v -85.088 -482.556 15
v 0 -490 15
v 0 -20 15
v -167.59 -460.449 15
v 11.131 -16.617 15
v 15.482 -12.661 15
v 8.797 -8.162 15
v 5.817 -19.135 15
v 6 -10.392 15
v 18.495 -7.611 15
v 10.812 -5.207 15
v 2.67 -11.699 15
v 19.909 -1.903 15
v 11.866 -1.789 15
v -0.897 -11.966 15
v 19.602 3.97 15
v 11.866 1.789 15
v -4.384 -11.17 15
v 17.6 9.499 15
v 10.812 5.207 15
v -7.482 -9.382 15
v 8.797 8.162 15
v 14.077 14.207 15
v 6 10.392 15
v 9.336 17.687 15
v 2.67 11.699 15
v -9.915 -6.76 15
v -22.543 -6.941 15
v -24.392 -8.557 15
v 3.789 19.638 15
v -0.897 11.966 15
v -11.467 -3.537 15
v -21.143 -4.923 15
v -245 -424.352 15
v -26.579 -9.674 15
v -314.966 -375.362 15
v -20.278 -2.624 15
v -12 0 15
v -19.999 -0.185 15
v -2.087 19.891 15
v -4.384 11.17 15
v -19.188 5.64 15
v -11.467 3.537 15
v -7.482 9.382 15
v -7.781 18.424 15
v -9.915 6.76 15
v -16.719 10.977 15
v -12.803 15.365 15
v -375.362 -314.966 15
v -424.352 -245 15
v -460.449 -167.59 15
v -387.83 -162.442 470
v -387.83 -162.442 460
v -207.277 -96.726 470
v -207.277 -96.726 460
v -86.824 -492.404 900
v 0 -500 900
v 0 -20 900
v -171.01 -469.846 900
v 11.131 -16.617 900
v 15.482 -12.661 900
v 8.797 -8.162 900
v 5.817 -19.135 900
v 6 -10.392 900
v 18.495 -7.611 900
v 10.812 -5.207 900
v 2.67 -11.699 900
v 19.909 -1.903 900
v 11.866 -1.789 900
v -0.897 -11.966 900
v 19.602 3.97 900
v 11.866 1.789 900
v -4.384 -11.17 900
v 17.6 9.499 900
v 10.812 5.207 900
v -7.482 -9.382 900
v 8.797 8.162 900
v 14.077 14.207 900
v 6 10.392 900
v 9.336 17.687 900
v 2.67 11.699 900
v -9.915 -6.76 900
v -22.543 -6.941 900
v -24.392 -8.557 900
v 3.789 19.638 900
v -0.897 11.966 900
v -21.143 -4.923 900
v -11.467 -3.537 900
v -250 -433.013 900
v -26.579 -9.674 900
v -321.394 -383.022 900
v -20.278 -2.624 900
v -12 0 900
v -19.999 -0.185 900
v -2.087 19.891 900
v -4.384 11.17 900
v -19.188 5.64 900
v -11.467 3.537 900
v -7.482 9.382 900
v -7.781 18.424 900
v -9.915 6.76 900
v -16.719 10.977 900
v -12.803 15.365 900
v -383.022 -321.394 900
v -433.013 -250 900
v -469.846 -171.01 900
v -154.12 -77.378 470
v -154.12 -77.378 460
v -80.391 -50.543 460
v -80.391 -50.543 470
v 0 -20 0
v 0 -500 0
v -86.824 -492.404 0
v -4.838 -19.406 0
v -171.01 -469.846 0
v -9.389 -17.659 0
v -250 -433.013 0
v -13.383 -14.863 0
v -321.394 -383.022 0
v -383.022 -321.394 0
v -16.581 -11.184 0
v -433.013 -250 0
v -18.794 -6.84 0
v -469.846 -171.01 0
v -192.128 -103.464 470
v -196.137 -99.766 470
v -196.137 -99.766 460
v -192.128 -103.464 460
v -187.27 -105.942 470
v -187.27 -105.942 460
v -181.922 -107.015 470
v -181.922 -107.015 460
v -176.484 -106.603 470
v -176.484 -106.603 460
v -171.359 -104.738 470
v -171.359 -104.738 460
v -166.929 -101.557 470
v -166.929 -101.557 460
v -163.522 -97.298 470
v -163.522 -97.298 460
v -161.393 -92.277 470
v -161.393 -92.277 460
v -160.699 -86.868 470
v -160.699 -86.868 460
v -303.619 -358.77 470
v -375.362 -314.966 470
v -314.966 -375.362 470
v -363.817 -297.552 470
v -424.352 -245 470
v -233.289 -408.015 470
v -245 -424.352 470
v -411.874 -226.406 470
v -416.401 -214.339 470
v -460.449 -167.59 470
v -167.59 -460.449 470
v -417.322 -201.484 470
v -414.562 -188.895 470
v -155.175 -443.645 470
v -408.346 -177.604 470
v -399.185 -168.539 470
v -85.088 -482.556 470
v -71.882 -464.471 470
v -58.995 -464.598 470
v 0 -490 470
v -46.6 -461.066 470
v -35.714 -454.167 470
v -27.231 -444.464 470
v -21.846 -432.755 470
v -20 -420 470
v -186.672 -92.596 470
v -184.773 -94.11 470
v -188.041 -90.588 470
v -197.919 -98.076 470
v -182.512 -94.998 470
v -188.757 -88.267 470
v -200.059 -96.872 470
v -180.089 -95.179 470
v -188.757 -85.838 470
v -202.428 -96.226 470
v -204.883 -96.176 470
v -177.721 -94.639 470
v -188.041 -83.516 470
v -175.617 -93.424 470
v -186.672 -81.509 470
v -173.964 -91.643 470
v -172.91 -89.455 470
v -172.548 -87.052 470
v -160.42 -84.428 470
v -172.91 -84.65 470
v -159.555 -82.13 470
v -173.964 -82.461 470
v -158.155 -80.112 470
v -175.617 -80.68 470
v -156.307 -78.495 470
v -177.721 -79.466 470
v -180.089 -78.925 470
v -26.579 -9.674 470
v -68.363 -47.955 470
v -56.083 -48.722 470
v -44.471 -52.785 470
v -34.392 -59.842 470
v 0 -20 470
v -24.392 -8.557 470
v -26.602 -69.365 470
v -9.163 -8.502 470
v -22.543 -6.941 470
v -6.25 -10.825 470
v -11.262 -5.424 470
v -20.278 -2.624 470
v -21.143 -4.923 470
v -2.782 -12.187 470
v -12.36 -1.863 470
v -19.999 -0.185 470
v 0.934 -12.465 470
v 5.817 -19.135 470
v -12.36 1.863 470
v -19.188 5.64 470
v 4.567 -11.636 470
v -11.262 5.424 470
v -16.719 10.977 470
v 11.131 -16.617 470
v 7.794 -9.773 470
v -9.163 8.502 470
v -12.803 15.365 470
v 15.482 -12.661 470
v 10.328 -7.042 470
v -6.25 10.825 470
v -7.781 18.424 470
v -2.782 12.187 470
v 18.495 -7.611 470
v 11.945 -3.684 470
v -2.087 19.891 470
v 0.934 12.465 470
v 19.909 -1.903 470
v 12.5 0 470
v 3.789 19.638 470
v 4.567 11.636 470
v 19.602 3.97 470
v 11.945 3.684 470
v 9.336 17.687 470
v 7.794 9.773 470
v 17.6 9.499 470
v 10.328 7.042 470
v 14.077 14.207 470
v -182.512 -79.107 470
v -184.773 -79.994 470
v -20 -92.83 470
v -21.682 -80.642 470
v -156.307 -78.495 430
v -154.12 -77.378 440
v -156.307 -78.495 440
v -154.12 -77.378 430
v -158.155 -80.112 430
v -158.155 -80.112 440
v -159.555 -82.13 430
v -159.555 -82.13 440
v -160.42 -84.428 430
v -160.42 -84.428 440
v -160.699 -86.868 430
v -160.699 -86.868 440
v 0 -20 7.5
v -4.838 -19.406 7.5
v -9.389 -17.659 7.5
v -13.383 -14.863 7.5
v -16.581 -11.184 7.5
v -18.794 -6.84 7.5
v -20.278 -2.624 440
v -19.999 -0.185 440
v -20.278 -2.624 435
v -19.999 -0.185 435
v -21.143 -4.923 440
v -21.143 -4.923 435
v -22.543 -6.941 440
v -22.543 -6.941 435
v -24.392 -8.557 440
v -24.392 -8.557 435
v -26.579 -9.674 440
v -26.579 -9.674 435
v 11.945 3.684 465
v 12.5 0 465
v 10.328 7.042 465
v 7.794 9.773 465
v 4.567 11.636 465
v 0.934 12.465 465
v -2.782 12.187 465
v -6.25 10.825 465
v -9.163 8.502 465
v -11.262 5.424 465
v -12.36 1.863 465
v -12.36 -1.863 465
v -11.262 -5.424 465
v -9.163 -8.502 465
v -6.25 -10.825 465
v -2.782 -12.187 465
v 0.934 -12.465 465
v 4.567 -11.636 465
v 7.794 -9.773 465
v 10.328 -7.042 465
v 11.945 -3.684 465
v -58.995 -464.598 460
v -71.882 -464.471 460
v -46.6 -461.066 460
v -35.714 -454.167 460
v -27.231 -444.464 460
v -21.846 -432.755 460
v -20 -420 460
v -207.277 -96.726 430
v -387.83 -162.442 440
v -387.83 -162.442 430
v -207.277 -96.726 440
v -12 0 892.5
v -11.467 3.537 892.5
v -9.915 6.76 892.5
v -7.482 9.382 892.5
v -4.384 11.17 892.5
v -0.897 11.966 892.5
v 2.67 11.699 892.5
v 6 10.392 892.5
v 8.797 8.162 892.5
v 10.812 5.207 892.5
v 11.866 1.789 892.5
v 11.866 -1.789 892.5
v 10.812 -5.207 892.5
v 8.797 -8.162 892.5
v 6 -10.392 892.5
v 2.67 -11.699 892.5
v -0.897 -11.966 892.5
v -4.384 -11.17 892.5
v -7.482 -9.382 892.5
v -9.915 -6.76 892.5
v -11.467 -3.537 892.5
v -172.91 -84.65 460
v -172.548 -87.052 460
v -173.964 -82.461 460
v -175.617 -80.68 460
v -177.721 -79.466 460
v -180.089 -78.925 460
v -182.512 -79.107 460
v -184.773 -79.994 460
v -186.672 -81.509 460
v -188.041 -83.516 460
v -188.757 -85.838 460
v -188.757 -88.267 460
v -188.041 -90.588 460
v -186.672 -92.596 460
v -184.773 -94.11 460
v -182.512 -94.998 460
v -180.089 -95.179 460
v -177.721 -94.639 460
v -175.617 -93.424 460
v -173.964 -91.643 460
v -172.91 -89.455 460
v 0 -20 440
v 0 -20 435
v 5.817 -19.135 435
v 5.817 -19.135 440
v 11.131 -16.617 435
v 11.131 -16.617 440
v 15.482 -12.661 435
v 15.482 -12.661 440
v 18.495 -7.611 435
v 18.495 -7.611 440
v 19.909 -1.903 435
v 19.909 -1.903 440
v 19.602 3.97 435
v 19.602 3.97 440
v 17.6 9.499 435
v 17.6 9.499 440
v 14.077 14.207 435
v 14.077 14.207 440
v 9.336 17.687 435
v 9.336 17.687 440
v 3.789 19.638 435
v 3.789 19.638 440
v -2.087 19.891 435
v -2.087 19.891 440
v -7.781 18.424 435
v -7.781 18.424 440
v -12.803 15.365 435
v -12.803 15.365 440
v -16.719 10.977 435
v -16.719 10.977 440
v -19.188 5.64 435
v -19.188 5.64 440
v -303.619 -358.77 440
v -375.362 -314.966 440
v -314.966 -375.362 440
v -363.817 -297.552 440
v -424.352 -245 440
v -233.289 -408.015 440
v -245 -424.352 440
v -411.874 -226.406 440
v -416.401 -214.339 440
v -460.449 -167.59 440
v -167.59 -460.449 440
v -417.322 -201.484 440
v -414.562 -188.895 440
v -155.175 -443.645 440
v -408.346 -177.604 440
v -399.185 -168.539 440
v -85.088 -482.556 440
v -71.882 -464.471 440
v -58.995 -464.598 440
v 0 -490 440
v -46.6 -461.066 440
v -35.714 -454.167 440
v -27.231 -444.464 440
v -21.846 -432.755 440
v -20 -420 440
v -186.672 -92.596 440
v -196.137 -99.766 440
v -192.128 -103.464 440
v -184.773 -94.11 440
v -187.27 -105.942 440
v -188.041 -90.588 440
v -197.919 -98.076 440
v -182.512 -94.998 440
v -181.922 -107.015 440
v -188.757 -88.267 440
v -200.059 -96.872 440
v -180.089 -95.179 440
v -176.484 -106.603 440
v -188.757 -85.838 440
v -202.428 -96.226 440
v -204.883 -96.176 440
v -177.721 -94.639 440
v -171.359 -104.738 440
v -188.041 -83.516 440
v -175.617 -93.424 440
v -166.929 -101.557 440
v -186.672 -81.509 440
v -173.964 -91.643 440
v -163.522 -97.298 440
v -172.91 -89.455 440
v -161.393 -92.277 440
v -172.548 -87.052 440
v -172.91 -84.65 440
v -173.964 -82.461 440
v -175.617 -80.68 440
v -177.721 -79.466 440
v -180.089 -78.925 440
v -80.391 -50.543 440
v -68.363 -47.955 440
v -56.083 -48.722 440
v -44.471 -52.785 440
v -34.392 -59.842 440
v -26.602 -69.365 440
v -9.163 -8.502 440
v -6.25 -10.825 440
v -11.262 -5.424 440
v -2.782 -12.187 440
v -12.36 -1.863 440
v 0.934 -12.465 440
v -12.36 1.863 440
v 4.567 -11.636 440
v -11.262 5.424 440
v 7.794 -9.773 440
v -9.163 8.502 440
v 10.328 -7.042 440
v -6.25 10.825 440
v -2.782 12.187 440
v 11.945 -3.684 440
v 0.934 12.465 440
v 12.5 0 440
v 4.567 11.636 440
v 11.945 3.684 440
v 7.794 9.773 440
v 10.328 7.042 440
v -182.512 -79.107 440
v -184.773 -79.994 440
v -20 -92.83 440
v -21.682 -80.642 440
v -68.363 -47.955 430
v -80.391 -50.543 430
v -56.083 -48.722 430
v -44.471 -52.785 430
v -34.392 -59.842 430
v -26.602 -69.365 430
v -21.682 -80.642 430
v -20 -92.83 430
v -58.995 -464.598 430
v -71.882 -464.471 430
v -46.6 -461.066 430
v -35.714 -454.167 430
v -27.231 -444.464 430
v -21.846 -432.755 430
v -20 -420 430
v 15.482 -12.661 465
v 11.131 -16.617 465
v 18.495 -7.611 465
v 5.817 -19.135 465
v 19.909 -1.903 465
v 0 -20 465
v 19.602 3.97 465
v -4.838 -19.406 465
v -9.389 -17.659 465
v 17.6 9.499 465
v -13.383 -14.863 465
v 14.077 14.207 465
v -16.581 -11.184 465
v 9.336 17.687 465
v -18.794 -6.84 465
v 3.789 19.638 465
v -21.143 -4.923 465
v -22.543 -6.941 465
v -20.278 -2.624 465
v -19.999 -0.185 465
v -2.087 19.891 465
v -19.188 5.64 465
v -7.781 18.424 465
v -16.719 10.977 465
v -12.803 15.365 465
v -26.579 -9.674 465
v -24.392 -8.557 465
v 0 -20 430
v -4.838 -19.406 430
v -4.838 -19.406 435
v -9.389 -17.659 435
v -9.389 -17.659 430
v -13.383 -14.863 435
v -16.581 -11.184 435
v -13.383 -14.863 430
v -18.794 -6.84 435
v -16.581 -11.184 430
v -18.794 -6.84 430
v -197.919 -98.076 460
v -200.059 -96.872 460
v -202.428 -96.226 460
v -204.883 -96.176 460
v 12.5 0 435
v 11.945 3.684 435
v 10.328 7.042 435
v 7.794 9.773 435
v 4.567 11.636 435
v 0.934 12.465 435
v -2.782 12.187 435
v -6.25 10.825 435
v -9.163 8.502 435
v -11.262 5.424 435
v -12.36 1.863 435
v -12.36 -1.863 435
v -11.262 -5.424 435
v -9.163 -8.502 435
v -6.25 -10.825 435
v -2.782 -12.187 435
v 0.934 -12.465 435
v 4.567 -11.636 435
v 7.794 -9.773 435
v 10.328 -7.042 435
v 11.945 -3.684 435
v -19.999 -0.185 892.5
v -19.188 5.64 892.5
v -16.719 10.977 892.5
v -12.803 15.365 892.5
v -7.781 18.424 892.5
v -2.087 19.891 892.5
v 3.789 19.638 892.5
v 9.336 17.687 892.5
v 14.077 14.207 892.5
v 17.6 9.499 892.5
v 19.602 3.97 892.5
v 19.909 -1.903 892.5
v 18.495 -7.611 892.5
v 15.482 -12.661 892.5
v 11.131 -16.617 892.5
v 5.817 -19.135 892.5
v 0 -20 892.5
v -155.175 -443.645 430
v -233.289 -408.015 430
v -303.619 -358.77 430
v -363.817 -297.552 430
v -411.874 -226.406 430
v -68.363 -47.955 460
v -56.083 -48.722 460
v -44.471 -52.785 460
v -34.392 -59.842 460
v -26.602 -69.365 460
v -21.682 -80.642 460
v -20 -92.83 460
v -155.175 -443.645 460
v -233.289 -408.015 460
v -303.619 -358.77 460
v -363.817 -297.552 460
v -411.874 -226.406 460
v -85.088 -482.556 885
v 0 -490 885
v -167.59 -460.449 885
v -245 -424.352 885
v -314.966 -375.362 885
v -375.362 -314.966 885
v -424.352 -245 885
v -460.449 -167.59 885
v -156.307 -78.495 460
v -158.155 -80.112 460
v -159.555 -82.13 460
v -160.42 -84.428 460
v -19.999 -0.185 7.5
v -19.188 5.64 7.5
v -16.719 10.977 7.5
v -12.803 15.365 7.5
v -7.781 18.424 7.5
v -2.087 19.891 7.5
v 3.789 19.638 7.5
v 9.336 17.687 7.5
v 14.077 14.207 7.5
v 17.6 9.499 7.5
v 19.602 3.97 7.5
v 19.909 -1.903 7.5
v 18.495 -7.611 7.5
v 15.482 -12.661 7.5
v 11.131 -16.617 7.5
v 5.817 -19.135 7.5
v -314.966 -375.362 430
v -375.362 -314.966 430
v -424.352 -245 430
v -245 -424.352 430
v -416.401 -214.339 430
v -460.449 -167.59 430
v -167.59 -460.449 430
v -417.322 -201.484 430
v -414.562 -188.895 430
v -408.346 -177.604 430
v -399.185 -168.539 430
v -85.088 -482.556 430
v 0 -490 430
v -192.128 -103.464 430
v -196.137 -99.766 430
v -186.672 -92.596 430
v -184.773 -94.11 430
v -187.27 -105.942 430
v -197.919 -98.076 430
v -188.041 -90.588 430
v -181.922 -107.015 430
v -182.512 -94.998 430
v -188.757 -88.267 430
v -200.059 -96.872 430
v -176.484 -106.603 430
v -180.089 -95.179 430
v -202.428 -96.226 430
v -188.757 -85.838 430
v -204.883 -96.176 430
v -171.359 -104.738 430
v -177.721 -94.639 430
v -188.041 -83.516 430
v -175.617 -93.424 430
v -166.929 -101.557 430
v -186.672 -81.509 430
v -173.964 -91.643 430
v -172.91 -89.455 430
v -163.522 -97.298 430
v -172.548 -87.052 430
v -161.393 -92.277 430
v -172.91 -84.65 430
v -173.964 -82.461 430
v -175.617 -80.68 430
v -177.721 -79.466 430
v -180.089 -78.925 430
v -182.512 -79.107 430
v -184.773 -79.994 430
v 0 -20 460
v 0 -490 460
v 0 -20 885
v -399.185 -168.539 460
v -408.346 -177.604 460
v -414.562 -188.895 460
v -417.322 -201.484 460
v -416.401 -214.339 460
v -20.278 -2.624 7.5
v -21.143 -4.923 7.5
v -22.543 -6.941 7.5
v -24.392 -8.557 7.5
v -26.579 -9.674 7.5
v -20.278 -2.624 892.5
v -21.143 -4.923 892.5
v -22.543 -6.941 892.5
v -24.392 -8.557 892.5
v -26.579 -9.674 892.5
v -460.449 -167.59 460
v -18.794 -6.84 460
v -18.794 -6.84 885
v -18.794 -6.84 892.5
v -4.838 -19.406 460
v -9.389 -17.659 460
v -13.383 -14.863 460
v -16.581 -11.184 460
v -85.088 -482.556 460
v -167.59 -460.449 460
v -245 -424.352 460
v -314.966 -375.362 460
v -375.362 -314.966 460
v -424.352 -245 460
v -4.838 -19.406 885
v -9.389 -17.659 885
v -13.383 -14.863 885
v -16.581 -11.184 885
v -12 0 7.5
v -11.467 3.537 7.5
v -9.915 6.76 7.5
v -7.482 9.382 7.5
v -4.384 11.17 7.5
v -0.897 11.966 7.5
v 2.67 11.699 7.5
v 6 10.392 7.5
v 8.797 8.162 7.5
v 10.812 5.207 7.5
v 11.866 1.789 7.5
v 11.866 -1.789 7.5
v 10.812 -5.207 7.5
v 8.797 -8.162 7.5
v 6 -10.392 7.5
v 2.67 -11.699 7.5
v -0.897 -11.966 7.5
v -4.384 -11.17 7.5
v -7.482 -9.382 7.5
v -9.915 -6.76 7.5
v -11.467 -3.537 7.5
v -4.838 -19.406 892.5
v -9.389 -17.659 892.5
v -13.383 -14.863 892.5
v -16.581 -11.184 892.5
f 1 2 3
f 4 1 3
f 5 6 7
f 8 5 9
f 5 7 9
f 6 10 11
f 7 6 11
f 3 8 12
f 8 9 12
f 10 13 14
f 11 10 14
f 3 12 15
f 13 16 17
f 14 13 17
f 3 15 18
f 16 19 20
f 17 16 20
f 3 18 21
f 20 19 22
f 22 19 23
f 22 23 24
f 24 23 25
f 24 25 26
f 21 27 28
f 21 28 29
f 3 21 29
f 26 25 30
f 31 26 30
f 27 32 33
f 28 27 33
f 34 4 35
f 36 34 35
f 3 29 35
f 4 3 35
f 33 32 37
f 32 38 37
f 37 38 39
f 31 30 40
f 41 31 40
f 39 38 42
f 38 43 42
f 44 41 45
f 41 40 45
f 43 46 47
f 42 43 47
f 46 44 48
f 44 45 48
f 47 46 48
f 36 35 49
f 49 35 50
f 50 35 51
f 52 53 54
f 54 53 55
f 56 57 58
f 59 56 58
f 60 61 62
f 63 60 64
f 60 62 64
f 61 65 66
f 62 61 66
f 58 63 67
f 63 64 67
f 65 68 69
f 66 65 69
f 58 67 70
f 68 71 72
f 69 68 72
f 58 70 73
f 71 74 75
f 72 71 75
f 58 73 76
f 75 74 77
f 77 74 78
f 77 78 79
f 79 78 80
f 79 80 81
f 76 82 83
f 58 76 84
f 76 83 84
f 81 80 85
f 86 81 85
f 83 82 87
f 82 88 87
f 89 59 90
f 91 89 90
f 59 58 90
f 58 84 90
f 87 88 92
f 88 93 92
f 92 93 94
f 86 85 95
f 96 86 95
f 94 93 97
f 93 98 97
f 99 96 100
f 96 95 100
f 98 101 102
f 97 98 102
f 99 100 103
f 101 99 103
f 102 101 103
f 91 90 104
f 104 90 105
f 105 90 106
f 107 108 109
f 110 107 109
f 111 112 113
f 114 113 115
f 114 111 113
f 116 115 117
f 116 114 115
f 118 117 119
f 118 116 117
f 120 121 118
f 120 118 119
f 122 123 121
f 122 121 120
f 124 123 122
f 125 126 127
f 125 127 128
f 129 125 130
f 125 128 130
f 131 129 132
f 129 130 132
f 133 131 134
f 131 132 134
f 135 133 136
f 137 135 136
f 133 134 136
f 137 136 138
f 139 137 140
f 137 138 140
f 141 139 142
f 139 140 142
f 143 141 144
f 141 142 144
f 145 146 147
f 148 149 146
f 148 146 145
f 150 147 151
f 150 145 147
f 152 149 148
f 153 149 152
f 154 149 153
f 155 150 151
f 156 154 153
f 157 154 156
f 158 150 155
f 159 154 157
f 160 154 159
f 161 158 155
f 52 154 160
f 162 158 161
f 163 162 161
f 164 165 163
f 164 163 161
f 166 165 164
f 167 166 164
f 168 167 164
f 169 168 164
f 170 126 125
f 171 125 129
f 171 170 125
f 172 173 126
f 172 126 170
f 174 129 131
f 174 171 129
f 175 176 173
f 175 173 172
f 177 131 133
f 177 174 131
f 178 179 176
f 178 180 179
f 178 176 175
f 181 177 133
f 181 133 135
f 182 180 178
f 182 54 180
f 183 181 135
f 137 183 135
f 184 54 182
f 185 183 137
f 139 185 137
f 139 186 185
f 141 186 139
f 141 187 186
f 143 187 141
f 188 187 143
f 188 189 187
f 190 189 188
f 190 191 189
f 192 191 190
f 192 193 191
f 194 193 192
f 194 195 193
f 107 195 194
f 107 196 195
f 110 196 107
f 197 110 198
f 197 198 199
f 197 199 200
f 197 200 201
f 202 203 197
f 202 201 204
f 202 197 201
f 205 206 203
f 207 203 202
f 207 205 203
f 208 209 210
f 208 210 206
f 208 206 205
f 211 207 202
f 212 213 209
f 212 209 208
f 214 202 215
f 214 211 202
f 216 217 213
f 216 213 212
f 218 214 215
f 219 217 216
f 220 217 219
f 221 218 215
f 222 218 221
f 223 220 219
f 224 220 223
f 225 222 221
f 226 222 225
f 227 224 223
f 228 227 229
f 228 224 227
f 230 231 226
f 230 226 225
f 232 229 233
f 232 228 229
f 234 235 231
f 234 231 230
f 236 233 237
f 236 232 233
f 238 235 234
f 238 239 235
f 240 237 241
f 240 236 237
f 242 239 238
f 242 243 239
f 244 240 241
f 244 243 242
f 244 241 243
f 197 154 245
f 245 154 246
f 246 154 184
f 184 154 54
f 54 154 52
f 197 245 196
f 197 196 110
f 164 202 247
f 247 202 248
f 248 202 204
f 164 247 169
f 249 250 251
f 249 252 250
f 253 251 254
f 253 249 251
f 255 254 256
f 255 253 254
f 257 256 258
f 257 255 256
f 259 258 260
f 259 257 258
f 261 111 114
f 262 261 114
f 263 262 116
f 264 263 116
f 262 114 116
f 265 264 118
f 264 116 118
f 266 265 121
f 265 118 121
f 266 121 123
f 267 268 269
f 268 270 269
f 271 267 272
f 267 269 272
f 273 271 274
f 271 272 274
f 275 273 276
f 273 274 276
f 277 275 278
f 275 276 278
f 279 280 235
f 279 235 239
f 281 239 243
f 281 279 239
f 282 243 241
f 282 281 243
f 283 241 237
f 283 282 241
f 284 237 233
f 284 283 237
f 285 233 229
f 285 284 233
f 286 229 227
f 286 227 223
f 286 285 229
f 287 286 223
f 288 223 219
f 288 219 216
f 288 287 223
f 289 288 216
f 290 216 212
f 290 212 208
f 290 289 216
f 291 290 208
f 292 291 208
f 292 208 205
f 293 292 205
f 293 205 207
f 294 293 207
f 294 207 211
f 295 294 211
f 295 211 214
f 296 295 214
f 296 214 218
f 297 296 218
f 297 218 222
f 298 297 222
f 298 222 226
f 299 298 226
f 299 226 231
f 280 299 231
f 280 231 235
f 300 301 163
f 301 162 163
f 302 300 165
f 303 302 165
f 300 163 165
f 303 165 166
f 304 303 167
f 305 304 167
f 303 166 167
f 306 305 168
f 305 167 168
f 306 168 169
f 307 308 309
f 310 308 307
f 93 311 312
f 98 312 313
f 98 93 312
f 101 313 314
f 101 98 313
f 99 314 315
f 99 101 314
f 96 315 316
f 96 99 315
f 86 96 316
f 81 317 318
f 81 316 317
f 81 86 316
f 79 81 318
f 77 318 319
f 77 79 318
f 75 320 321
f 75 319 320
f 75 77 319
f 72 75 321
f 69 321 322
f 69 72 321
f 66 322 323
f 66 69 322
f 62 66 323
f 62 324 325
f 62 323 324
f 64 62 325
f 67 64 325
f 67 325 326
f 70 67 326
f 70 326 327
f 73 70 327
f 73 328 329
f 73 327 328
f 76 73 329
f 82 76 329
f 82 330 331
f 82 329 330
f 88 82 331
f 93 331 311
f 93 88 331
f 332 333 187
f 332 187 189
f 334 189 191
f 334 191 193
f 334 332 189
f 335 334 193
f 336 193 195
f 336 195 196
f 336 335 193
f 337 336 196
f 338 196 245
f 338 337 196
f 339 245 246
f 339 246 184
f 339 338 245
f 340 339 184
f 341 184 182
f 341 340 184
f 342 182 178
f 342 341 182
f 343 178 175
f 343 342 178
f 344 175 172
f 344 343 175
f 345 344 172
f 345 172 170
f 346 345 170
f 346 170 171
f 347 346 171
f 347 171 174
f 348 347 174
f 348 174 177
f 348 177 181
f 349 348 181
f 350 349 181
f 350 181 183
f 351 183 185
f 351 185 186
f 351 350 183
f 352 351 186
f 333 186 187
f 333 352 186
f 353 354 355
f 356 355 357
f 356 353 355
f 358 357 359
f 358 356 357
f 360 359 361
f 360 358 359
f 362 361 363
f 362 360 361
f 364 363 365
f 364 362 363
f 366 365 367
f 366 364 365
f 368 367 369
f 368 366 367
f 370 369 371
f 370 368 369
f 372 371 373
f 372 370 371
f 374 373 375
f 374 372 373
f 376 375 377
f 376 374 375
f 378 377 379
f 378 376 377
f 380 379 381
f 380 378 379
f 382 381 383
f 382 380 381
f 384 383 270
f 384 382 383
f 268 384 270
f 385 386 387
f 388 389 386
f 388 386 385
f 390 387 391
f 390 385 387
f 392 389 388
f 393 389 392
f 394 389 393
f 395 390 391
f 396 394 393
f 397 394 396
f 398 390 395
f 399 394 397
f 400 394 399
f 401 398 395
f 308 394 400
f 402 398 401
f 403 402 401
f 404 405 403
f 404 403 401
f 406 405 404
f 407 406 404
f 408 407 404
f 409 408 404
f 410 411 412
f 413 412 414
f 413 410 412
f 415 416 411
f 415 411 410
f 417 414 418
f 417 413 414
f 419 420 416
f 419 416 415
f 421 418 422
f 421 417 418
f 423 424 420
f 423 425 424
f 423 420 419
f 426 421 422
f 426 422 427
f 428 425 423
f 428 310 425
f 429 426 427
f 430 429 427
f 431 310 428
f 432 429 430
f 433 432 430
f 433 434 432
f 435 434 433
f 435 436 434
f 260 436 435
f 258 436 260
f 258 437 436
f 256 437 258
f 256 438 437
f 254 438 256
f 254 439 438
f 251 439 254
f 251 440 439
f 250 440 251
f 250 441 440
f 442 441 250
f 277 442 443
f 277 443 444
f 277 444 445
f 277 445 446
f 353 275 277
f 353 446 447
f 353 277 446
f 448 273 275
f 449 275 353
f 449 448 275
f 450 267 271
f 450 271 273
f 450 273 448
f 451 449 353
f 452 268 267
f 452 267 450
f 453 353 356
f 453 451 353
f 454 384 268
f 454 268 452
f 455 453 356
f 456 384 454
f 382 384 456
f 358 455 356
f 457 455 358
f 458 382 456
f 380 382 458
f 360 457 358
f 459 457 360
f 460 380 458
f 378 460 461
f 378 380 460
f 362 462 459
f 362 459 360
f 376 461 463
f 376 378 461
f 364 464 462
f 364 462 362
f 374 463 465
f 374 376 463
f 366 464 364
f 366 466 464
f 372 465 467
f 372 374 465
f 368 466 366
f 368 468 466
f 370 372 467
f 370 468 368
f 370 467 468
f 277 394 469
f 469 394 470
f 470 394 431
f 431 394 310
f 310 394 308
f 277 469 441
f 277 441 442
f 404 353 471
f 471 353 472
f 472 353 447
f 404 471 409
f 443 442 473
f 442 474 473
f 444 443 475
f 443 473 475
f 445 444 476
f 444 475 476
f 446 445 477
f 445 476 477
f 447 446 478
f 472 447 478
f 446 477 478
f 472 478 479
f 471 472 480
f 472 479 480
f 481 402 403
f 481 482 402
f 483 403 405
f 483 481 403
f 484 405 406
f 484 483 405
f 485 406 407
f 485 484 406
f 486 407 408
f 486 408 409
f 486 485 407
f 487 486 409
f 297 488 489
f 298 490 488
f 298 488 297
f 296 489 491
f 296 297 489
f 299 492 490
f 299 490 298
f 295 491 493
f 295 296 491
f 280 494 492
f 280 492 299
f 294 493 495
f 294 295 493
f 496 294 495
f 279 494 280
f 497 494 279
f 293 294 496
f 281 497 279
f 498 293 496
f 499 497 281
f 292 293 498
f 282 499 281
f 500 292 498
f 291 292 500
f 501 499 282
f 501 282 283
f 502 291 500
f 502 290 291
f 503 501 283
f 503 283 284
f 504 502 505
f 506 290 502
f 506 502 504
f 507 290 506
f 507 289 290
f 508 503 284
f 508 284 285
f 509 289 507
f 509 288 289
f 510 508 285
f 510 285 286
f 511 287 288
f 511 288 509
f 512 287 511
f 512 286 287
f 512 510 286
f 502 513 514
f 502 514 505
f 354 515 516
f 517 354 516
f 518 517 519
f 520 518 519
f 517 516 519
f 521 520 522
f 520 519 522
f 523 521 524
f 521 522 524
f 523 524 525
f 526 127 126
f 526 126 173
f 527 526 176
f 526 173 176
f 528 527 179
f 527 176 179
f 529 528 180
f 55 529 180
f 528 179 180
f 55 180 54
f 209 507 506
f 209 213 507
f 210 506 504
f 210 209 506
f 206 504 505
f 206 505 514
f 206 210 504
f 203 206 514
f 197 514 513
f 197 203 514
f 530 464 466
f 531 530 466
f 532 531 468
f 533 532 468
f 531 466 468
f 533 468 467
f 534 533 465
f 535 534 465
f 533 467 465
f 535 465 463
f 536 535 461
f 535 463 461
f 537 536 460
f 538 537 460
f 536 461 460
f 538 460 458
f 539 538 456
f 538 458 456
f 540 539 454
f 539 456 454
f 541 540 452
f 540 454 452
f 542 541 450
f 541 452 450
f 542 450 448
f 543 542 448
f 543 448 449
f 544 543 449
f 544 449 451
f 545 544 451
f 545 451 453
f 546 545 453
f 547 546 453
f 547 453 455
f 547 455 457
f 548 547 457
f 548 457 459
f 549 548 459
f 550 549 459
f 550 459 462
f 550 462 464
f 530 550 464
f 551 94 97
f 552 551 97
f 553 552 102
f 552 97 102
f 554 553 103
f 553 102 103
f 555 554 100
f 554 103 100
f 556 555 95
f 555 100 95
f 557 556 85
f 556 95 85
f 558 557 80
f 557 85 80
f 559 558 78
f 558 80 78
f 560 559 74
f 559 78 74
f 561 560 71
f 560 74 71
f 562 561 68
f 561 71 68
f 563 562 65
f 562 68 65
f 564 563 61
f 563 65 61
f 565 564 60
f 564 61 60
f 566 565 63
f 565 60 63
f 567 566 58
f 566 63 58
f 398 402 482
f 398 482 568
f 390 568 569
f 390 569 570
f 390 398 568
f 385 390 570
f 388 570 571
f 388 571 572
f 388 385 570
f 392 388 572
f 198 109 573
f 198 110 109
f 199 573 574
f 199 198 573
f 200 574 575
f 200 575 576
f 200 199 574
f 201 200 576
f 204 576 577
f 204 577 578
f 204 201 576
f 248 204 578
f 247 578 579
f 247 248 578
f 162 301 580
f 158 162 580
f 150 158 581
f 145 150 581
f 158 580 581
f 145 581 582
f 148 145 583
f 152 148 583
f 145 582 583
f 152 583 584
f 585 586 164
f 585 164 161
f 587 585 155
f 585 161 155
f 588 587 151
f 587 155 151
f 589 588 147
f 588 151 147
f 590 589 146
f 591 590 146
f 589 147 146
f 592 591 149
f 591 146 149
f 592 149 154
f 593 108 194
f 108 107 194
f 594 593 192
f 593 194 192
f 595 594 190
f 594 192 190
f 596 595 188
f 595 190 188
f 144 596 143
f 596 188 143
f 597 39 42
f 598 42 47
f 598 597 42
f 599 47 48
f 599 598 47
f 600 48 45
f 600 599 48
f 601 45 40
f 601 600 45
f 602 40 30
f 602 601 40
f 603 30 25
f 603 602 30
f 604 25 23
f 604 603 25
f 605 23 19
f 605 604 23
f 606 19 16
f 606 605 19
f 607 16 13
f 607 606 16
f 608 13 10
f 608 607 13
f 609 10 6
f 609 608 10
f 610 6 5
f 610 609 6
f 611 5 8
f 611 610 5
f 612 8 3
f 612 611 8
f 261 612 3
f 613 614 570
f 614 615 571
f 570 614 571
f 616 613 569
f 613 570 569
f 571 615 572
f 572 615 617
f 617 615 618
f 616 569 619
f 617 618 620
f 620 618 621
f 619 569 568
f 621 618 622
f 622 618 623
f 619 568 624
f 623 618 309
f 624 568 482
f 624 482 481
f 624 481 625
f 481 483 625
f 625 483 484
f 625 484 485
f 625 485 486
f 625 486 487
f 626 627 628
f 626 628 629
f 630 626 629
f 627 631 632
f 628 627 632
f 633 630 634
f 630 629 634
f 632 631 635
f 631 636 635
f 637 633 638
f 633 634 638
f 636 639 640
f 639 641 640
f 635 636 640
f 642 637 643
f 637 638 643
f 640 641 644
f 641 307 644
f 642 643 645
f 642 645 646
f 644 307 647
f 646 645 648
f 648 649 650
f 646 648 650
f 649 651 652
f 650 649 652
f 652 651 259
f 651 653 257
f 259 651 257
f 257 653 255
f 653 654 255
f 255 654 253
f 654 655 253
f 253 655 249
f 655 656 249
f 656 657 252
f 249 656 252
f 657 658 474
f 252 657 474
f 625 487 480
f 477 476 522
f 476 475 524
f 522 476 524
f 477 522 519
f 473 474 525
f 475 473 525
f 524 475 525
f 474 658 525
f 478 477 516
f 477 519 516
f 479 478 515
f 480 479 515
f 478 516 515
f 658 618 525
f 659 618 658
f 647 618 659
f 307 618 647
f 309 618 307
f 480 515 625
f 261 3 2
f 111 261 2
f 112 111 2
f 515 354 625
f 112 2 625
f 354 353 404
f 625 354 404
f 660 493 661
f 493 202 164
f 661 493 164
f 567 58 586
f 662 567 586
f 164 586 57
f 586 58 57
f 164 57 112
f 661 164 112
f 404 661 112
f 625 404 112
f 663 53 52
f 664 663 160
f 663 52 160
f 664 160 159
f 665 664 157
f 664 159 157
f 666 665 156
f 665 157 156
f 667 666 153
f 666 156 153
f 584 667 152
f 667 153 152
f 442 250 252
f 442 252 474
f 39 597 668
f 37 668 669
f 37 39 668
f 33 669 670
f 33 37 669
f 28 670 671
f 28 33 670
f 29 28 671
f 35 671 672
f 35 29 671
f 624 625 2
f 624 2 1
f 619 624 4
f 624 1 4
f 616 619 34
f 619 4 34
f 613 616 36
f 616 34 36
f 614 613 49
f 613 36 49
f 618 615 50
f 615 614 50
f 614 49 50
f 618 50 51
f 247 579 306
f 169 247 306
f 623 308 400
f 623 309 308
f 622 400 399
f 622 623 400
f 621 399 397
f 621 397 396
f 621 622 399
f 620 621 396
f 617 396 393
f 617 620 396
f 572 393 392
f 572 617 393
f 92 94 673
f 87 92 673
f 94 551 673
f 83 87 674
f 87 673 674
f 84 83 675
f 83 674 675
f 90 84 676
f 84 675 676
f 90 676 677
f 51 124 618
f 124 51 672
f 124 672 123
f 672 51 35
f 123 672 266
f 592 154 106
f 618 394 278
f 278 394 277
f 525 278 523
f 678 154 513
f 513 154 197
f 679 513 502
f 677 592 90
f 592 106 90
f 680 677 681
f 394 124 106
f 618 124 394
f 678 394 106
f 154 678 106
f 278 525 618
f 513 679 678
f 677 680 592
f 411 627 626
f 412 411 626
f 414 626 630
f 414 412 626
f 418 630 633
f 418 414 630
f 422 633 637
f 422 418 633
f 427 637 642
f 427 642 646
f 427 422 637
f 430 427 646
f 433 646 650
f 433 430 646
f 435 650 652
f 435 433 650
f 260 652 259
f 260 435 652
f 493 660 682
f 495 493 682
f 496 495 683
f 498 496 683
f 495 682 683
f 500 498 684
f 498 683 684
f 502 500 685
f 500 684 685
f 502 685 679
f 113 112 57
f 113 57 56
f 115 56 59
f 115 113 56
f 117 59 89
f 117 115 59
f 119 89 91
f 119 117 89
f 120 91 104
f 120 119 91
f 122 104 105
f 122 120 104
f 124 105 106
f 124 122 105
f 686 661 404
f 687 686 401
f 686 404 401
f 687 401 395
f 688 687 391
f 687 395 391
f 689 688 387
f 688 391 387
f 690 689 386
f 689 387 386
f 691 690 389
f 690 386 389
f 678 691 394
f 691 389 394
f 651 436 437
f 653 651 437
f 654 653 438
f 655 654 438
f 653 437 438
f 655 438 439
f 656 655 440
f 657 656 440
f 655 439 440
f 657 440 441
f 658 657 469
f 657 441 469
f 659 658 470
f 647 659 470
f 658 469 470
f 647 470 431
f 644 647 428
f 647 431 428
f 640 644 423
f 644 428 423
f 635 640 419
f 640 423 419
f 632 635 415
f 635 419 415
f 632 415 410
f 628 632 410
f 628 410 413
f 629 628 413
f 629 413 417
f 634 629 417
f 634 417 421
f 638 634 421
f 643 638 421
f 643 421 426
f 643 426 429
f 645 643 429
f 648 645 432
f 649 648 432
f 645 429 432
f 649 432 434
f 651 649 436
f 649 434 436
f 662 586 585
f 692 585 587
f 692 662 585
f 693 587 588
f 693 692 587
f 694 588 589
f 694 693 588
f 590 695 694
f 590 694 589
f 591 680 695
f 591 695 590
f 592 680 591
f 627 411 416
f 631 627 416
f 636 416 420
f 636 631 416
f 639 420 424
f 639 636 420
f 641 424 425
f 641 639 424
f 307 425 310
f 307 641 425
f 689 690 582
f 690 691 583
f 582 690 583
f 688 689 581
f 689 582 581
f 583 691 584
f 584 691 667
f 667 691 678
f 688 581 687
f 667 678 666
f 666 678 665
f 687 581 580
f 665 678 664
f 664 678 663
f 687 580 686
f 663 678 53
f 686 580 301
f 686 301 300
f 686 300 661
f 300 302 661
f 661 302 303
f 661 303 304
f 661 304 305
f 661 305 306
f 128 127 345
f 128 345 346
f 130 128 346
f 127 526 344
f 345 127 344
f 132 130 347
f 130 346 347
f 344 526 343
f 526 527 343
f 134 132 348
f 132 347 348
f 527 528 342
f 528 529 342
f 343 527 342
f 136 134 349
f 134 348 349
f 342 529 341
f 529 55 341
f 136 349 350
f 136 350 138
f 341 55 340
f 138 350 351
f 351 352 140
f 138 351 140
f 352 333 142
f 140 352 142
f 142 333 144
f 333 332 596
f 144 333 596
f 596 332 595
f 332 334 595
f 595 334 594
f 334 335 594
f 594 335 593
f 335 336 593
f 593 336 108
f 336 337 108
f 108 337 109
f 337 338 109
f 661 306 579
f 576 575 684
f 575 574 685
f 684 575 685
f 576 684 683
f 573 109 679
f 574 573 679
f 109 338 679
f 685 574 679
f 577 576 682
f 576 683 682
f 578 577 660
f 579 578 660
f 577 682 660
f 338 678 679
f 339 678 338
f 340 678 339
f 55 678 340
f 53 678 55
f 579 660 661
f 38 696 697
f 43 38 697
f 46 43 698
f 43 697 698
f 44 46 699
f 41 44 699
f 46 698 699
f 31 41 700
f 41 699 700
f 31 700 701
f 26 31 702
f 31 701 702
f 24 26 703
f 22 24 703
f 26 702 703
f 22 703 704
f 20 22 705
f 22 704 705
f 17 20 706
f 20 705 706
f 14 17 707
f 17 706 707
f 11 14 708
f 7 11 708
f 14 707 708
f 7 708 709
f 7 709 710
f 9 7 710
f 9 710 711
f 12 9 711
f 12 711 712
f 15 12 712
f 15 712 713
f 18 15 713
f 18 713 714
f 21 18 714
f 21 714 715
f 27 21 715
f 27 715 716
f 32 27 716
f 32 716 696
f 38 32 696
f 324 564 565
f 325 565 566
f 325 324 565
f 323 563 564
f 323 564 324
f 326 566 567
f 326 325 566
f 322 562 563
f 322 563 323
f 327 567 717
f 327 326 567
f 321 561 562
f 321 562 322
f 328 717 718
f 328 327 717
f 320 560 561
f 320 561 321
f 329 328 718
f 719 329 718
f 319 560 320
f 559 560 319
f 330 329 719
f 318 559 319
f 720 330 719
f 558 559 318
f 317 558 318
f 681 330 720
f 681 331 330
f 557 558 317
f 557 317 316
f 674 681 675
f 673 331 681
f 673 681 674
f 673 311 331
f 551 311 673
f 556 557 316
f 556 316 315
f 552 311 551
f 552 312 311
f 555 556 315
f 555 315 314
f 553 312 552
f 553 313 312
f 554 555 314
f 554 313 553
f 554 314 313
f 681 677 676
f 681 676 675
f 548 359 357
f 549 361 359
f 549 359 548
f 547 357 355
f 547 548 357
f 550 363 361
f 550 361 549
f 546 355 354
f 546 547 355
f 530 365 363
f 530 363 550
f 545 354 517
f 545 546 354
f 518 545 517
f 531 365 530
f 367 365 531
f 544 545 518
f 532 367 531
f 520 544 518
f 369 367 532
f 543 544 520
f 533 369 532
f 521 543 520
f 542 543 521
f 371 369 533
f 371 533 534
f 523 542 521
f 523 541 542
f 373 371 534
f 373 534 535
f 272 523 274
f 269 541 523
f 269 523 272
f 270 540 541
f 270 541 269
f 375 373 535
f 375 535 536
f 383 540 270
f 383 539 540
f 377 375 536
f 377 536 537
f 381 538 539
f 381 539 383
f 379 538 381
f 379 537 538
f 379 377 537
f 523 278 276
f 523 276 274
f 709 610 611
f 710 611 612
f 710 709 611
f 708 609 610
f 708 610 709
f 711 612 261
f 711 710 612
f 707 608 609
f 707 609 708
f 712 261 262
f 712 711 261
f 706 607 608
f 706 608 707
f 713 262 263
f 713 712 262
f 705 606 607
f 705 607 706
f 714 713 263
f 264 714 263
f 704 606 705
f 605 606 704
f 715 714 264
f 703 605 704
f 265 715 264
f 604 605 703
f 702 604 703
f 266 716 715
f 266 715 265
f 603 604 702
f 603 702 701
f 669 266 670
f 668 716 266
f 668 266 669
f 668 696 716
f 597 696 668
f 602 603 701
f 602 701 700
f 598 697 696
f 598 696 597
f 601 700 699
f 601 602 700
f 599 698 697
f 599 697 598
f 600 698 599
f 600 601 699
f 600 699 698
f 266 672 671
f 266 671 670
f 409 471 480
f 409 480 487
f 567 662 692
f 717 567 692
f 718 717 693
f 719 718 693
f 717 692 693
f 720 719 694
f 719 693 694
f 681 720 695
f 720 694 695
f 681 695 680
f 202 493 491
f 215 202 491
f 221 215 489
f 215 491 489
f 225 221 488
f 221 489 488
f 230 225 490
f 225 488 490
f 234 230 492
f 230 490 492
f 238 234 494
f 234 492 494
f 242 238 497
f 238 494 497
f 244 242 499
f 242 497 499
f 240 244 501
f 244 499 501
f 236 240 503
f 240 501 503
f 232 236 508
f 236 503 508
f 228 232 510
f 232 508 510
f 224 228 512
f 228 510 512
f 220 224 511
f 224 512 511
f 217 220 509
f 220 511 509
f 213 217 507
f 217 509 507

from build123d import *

# Parameters (mm, degrees)
DODANIE_WYCI_GNI_CIE1_DEPTH = 900
SKORUPA1_T                  = -10
SZKIC4_R                    = 12
DODANIE_WYCI_GNI_CIE3_DEPTH = 15
SZKIC6_R                    = 12.5
SZKIC6_R_2                  = 8.15
DODANIE_WYCI_GNI_CIE4_DEPTH = 10
ZAOKR_GLENIE3_R             = 45
SZKIC8_R                    = 20
WYTNIJ_WYCI_GNI_CIE1_DEPTH  = 7.5
SZKIC11_R                   = 20
WYTNIJ_WYCI_GNI_CIE2_DEPTH  = 5
SZKIC12_R                   = 20
WYTNIJ_WYCI_GNI_CIE3_DEPTH  = 5
SZKIC13_R                   = 20
WYTNIJ_WYCI_GNI_CIE4_DEPTH  = 7.5
ZAOKR_GLENIE4_R             = 10
ZAOKR_GLENIE5_R             = 10


with BuildPart() as part:
    # Szkic1 → Dodanie-wyciągnięcie1 (new body)
    with BuildSketch(Plane.XY):
        with BuildLine():
            Line((-469.846310393, -171.010071663), (0, 0))
            Line((0, 0), (0, -500))
            ThreePointArc((0, -500), (-286.788218176, -409.576022144), (-469.846310393, -171.010071663))
        make_face()
    extrude(amount=DODANIE_WYCI_GNI_CIE1_DEPTH)

    # Skorupa1
    skorupa1_openings = [part.faces().sort_by_distance(p)[0] for p in [
        (-179.521279962, -256.382958146, 900),
        (-179.521279962, -256.382958146, 0),
        (-234.923155196, -85.505035831, 450),
        (0, -250, 450),
    ]]
    offset(amount=SKORUPA1_T, openings=skorupa1_openings, kind=Kind.INTERSECTION)

    # Szkic4 → Dodanie-wyciągnięcie3 (add)
    with BuildSketch(Plane(origin=(0, 0, 0), x_dir=(-1, 0, 0), z_dir=(0, 0, -1))):
        with BuildLine():
            Line((0, -20), (0, -490))
            ThreePointArc((0, -490), (281.052453812, -401.384501702), (460.449384185, -167.58987023))
            Line((460.449384185, -167.58987023), (18.793852416, -6.840402867))
            ThreePointArc((18.793852416, -6.840402867), (-11.471528727, 16.383040886), (0, -20))
        make_face()
        Circle(SZKIC4_R, mode=Mode.SUBTRACT)
    dodanie_wyci_gni_cie3 = extrude(amount=-DODANIE_WYCI_GNI_CIE3_DEPTH)

    # Lustro1: Dodanie-wyciągnięcie3 across plane
    add(dodanie_wyci_gni_cie3.mirror(Plane.XY.offset(450)))

    # Szkic6 → Dodanie-wyciągnięcie4 (add)
    with BuildSketch(Plane.XY.offset(440)):
        with BuildLine():
            Line((-18.793852416, -6.840402867), (-460.449384185, -167.58987023))
            ThreePointArc((-460.449384185, -167.58987023), (-281.052453812, -401.384501702), (0, -490))
            Line((0, -490), (0, -20))
            ThreePointArc((0, -20), (11.471528727, 16.383040886), (-18.793852416, -6.840402867))
        make_face()
        Circle(SZKIC6_R, mode=Mode.SUBTRACT)
        with Locations((-180.698070908, -87.052274649)):
            Circle(SZKIC6_R_2, mode=Mode.SUBTRACT)
        with BuildLine():
            Line((-20, -28.562960135), (-20, -469.574275275))
            ThreePointArc((-20, -469.574275275), (-269.580925085, -385.001460816), (-434.41507852, -179.397713347))
            Line((-434.41507852, -179.397713347), (-199.491923324, -93.892677516))
            ThreePointArc((-199.491923324, -93.892677516), (-173.857668042, -105.846127065), (-161.904218492, -80.211871783))
            Line((-161.904218492, -80.211871783), (-20, -28.562960135))
        make_face(mode=Mode.SUBTRACT)
    dodanie_wyci_gni_cie4 = extrude(amount=-DODANIE_WYCI_GNI_CIE4_DEPTH)

    # Lustro6: Dodanie-wyciągnięcie4 across plane
    add(dodanie_wyci_gni_cie4.mirror(Plane.XY.offset(450)))

    # Zaokrąglenie3
    zaokr_glenie3_edges = [part.edges().sort_by_distance(p)[0] for p in [
        (-434.41507852, -179.397713347, 435),
        (-20, -28.562960135, 435),
        (-20, -469.574275275, 435),
        (-20, -469.574275275, 465),
        (-20, -28.562960135, 465),
        (-434.41507852, -179.397713347, 465),
    ]]
    fillet(zaokr_glenie3_edges, radius=ZAOKR_GLENIE3_R)

    # Szkic8 → Wytnij-wyciągnięcie1 (cut)
    with BuildSketch(Plane(origin=(0, 0, 0), x_dir=(-1, 0, 0), z_dir=(0, 0, -1))):
        Circle(SZKIC8_R)
    extrude(amount=-WYTNIJ_WYCI_GNI_CIE1_DEPTH, mode=Mode.SUBTRACT)

    # Szkic11 → Wytnij-wyciągnięcie2 (cut)
    with BuildSketch(Plane(origin=(0, 0, 430), x_dir=(-1, 0, 0), z_dir=(0, 0, -1))):
        Circle(SZKIC11_R)
    extrude(amount=-WYTNIJ_WYCI_GNI_CIE2_DEPTH, mode=Mode.SUBTRACT)

    # Szkic12 → Wytnij-wyciągnięcie3 (cut)
    with BuildSketch(Plane(origin=(0, 0, 460), x_dir=(-1, 0, 0), z_dir=(0, 0, -1))):
        Circle(SZKIC12_R)
    extrude(amount=-WYTNIJ_WYCI_GNI_CIE3_DEPTH, mode=Mode.SUBTRACT)

    # Szkic13 → Wytnij-wyciągnięcie4 (cut)
    with BuildSketch(Plane(origin=(0, 0, 885), x_dir=(-1, 0, 0), z_dir=(0, 0, -1))):
        Circle(SZKIC13_R)
    extrude(amount=-WYTNIJ_WYCI_GNI_CIE4_DEPTH, mode=Mode.SUBTRACT)

    # Zaokrąglenie4
    zaokr_glenie4_edges = [part.edges().sort_by_distance(p)[0] for p in [
        (-18.793852416, -6.840402867, 437.5),
        (-18.793852416, -6.840402867, 896.25),
        (-18.793852416, -6.840402867, 11.25),
        (-18.793852416, -6.840402867, 467.5),
    ]]
    fillet(zaokr_glenie4_edges, radius=ZAOKR_GLENIE4_R)

    # Zaokrąglenie5
    zaokr_glenie5_edges = [part.edges().sort_by_distance(p)[0] for p in [
        (-199.491923324, -93.892677516, 435),
        (-161.904218492, -80.211871783, 435),
        (-161.904218492, -80.211871783, 465),
        (-199.491923324, -93.892677516, 465),
    ]]
    fillet(zaokr_glenie5_edges, radius=ZAOKR_GLENIE5_R)


solid = part.part
